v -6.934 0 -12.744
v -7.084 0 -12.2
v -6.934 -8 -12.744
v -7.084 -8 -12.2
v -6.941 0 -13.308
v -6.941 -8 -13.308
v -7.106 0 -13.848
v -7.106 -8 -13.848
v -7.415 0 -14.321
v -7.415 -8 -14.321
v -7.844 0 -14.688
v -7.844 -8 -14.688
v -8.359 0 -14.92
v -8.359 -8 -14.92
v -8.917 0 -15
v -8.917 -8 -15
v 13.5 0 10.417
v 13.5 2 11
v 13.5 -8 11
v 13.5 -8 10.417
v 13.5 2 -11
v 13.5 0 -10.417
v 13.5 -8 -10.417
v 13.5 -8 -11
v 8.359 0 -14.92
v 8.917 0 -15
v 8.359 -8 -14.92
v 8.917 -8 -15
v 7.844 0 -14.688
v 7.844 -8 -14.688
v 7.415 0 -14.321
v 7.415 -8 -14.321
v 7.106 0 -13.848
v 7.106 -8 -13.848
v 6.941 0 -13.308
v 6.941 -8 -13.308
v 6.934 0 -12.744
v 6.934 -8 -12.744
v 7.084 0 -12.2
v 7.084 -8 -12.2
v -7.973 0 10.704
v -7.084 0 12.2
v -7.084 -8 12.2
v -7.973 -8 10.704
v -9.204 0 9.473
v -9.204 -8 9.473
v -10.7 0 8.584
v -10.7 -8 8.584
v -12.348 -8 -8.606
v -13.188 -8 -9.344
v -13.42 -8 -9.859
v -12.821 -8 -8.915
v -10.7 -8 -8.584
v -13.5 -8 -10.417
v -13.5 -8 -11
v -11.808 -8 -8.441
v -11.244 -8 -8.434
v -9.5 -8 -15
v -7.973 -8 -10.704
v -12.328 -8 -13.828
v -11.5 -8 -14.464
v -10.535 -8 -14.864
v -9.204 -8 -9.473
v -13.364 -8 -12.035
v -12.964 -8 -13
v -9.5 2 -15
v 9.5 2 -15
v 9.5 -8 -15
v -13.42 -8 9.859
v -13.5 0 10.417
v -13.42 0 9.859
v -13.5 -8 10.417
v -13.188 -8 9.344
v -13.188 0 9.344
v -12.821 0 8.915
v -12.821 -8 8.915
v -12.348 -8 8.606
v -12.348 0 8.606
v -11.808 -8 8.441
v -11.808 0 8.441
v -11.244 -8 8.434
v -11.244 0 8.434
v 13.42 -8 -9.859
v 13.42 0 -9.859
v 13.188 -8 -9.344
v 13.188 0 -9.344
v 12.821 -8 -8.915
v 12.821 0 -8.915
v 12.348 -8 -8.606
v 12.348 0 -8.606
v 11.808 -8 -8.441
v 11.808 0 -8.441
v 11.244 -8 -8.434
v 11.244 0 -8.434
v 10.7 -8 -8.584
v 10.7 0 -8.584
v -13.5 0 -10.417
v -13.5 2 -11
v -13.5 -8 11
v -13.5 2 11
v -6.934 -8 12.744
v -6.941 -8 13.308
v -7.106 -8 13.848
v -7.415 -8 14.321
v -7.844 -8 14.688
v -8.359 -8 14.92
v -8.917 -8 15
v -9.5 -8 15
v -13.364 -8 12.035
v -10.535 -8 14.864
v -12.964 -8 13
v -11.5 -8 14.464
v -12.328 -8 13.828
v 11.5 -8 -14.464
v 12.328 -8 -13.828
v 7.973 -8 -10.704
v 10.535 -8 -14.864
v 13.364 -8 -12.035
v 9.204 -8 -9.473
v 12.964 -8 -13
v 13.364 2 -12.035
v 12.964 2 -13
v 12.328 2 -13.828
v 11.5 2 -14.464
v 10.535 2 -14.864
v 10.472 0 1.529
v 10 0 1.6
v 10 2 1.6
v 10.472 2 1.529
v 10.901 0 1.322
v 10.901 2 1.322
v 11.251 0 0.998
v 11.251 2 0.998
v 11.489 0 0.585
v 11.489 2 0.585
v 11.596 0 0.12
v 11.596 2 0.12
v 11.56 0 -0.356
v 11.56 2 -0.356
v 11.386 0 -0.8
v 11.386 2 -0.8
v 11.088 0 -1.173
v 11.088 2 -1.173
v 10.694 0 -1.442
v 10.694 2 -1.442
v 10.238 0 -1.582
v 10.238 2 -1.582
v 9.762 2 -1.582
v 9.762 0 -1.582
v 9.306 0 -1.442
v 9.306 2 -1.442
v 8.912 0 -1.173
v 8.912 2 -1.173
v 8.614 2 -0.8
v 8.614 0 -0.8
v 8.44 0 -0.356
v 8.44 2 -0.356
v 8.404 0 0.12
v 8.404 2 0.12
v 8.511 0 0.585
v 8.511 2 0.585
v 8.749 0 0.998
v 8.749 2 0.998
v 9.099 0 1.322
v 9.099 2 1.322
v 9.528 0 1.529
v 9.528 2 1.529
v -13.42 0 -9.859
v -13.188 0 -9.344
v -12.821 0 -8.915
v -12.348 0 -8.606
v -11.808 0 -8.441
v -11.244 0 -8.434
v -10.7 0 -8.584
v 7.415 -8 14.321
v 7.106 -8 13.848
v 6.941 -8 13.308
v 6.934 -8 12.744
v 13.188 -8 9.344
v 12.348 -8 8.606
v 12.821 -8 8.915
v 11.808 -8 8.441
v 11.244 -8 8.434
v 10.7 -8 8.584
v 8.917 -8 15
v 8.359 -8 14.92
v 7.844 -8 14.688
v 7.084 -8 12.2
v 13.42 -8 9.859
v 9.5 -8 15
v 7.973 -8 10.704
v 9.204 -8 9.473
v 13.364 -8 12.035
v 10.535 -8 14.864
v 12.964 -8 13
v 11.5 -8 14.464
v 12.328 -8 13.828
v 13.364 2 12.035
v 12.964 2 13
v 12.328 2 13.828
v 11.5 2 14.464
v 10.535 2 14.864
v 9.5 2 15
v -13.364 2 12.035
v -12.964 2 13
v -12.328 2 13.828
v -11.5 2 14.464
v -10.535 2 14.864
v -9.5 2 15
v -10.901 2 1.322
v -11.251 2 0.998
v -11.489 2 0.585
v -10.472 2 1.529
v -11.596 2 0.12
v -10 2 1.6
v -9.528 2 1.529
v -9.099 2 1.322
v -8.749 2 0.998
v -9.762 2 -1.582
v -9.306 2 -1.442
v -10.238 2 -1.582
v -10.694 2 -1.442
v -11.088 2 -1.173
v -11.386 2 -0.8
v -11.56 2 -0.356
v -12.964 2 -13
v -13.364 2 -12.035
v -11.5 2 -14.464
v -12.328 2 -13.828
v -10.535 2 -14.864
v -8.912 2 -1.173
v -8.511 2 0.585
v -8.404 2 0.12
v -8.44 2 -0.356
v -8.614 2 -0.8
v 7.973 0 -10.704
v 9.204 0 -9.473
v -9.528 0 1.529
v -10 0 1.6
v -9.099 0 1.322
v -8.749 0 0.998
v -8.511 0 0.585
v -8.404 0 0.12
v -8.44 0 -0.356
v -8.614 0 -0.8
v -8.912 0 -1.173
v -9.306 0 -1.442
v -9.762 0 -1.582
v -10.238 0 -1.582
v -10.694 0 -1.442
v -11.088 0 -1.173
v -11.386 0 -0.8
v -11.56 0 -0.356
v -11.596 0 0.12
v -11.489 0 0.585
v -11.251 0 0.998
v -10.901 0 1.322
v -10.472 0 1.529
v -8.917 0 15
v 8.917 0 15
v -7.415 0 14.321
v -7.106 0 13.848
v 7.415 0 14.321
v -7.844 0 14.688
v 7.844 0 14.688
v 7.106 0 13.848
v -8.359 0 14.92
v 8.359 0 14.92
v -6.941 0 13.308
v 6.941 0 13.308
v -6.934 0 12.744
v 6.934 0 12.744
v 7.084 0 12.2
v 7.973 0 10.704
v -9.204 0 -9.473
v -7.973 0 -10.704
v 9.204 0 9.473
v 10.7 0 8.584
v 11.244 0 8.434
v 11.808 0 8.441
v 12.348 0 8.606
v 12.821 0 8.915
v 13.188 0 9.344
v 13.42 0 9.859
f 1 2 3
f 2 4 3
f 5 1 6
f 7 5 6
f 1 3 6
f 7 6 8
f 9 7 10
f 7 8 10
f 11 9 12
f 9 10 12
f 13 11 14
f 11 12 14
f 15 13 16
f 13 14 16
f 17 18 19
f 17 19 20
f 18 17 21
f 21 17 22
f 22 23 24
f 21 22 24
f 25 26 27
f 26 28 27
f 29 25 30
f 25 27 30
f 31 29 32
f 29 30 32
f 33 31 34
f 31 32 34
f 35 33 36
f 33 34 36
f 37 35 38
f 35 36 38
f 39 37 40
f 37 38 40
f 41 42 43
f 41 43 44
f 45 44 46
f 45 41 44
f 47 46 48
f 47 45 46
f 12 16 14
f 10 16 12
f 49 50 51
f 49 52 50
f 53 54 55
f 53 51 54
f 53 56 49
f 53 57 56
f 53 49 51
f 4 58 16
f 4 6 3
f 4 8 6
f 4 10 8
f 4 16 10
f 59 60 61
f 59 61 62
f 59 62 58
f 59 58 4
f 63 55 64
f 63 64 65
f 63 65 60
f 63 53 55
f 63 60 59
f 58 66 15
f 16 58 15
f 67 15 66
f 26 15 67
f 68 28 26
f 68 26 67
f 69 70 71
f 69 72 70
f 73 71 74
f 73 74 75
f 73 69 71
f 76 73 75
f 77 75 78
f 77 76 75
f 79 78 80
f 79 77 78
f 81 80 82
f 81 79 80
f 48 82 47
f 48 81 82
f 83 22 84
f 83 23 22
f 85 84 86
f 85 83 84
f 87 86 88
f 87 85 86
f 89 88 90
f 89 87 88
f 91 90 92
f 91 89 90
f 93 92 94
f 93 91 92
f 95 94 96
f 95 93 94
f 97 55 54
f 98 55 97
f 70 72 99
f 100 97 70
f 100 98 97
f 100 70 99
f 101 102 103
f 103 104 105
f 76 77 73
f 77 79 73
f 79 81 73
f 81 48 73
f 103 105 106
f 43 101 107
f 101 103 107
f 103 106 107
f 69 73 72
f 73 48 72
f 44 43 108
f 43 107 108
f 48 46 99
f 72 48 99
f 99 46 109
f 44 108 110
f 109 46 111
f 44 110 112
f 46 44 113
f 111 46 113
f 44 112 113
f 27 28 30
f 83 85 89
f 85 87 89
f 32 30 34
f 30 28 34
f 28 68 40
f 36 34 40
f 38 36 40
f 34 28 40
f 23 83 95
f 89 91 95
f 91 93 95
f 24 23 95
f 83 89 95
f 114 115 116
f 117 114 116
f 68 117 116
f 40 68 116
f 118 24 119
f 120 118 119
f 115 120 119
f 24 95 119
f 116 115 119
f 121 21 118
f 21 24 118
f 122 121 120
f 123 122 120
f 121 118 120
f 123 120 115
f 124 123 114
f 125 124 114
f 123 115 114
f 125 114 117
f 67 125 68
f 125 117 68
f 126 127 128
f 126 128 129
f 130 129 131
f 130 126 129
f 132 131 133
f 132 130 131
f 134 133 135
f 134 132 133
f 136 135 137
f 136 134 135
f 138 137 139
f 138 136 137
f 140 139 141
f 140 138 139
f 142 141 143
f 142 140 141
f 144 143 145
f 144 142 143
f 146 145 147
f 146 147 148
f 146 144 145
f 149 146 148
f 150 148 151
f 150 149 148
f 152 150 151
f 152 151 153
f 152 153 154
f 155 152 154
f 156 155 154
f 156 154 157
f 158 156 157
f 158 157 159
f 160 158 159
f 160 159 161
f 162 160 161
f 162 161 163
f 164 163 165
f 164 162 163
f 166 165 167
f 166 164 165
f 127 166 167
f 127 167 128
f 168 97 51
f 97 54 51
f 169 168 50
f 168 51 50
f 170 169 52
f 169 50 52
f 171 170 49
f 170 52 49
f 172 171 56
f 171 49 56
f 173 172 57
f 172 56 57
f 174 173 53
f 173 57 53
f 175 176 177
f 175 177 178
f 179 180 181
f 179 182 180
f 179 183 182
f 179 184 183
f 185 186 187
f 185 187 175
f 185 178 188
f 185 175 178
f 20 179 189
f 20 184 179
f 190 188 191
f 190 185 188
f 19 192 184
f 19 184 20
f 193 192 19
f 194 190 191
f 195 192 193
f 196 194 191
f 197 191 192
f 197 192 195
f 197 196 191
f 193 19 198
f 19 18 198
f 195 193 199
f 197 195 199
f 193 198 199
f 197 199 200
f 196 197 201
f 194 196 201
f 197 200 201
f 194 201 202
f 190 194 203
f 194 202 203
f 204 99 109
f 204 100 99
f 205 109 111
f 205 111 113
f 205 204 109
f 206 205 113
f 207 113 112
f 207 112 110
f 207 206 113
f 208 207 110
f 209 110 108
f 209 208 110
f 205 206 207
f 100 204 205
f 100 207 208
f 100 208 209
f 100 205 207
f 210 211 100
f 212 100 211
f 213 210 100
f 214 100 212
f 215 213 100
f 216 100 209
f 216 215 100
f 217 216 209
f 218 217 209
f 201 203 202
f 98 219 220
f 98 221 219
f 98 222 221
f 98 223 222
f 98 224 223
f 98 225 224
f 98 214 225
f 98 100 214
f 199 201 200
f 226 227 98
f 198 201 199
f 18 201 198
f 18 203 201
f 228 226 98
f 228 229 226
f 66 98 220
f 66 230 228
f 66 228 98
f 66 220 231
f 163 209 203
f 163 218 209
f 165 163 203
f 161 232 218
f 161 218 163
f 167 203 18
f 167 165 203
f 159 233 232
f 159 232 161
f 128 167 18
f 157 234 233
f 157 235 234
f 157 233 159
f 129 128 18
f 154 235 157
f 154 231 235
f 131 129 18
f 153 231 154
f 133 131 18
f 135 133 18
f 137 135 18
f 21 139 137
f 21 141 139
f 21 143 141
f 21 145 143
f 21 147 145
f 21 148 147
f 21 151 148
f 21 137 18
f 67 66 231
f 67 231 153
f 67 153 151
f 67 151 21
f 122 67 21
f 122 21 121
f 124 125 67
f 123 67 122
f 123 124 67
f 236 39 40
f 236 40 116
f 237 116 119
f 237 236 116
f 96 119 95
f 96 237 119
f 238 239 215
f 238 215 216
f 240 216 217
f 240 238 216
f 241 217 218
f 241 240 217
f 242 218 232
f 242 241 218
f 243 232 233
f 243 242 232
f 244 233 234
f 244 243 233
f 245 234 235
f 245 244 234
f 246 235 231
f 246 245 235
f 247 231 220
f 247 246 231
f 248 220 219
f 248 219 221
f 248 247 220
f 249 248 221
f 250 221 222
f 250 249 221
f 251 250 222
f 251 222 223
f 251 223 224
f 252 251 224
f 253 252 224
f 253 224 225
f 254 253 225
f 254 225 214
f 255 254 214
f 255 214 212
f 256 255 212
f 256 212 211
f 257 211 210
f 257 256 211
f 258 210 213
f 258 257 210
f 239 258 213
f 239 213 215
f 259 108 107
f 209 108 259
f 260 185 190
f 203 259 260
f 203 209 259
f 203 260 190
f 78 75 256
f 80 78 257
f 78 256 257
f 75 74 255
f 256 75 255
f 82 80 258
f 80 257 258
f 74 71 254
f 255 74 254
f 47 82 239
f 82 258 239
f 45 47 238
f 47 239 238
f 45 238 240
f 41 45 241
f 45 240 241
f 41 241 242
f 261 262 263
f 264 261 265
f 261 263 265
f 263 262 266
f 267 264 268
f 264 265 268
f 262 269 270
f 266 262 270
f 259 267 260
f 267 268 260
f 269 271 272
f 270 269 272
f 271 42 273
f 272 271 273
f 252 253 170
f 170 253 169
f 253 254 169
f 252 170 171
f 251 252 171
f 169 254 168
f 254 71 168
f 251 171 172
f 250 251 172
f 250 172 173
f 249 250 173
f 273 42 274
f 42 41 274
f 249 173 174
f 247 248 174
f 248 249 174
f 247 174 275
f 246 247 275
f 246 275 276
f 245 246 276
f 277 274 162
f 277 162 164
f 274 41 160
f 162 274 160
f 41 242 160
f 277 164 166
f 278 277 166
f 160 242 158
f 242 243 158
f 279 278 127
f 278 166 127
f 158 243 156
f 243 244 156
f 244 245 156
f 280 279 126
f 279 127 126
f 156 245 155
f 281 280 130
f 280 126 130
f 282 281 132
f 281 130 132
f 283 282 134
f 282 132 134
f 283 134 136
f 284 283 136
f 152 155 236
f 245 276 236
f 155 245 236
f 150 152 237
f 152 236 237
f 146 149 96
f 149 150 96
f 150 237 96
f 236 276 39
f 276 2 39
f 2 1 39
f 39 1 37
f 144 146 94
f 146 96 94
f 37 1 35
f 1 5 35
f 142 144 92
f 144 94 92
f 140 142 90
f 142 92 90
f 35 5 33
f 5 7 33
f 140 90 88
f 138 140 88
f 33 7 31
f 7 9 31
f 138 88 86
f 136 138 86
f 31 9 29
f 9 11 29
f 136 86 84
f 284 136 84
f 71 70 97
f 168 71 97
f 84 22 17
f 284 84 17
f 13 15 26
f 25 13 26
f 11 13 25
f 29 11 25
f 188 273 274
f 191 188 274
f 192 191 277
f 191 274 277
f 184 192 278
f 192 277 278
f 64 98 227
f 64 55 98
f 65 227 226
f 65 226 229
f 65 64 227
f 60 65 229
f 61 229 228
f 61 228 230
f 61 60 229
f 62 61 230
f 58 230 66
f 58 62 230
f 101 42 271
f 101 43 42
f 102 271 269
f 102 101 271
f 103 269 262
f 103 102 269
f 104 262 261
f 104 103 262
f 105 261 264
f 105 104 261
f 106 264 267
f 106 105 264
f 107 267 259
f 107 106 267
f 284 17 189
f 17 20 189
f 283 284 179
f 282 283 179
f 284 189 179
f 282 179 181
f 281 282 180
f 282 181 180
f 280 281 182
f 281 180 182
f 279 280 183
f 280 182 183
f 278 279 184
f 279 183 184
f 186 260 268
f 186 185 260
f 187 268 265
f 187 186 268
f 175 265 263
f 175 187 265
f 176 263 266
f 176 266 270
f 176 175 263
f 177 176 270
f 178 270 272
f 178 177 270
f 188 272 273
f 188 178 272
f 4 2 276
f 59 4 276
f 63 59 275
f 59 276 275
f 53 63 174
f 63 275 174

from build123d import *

# Parameters (mm, degrees)
SZKIC1_W                    = 27
SZKIC1_H                    = 30
SZKIC1_R                    = 1.6
DODANIE_WYCI_GNI_CIE1_DEPTH = 2
DODANIE_WYCI_GNI_CIE2_DEPTH = 8
ZAOKR_GLENIE1_R             = 4
ZAOKR_GLENIE2_R             = 2


with BuildPart() as part:
    # Szkic1 → Dodanie-wyciągnięcie1 (new body)
    with BuildSketch(Plane(origin=(0, 0, 0), x_dir=(1, 0, 0), z_dir=(0, 1, 0))):
        Rectangle(SZKIC1_W, SZKIC1_H)
        with Locations(Location((10, 0, 0), (0, 0, 270))):
            Circle(SZKIC1_R, mode=Mode.SUBTRACT)
        with Locations(Location((-10, 0, 0), (0, 0, 270))):
            Circle(SZKIC1_R, mode=Mode.SUBTRACT)
    extrude(amount=DODANIE_WYCI_GNI_CIE1_DEPTH)

    # Szkic2 → Dodanie-wyciągnięcie2 (add)
    with BuildSketch(Plane.XZ):
        with BuildLine():
            Line((-13.5, 8), (-13.5, 15))
            Line((-13.5, 15), (-6.5, 15))
            ThreePointArc((-6.5, 15), (-8.550252532, 10.050252532), (-13.5, 8))
        make_face()
        with BuildLine():
            Line((13.5, 8), (13.5, 15))
            Line((13.5, 15), (6.5, 15))
            ThreePointArc((6.5, 15), (8.550252532, 10.050252532), (13.5, 8))
        make_face()
        with BuildLine():
            Line((13.5, -15), (6.5, -15))
            ThreePointArc((6.5, -15), (8.550252532, -10.050252532), (13.5, -8))
            Line((13.5, -8), (13.5, -15))
        make_face()
        with BuildLine():
            Line((-13.5, -8), (-13.5, -15))
            Line((-13.5, -15), (-6.5, -15))
            ThreePointArc((-6.5, -15), (-8.550252532, -10.050252532), (-13.5, -8))
        make_face()
    extrude(amount=DODANIE_WYCI_GNI_CIE2_DEPTH)

    # Zaokrąglenie1
    zaokr_glenie1_edges = [part.edges().sort_by_distance(p)[0] for p in [
        (13.5, -3, 15),
        (-13.5, -3, 15),
        (-13.5, -3, -15),
        (13.5, -3, -15),
    ]]
    fillet(zaokr_glenie1_edges, radius=ZAOKR_GLENIE1_R)

    # Zaokrąglenie2
    zaokr_glenie2_edges = [part.edges().sort_by_distance(p)[0] for p in [
        (-6.5, -4, 15),
        (-13.5, -4, 8),
        (6.5, -4, 15),
        (13.5, -4, 8),
        (13.5, -4, -8),
        (6.5, -4, -15),
        (-6.5, -4, -15),
        (-13.5, -4, -8),
    ]]
    fillet(zaokr_glenie2_edges, radius=ZAOKR_GLENIE2_R)


solid = part.part
